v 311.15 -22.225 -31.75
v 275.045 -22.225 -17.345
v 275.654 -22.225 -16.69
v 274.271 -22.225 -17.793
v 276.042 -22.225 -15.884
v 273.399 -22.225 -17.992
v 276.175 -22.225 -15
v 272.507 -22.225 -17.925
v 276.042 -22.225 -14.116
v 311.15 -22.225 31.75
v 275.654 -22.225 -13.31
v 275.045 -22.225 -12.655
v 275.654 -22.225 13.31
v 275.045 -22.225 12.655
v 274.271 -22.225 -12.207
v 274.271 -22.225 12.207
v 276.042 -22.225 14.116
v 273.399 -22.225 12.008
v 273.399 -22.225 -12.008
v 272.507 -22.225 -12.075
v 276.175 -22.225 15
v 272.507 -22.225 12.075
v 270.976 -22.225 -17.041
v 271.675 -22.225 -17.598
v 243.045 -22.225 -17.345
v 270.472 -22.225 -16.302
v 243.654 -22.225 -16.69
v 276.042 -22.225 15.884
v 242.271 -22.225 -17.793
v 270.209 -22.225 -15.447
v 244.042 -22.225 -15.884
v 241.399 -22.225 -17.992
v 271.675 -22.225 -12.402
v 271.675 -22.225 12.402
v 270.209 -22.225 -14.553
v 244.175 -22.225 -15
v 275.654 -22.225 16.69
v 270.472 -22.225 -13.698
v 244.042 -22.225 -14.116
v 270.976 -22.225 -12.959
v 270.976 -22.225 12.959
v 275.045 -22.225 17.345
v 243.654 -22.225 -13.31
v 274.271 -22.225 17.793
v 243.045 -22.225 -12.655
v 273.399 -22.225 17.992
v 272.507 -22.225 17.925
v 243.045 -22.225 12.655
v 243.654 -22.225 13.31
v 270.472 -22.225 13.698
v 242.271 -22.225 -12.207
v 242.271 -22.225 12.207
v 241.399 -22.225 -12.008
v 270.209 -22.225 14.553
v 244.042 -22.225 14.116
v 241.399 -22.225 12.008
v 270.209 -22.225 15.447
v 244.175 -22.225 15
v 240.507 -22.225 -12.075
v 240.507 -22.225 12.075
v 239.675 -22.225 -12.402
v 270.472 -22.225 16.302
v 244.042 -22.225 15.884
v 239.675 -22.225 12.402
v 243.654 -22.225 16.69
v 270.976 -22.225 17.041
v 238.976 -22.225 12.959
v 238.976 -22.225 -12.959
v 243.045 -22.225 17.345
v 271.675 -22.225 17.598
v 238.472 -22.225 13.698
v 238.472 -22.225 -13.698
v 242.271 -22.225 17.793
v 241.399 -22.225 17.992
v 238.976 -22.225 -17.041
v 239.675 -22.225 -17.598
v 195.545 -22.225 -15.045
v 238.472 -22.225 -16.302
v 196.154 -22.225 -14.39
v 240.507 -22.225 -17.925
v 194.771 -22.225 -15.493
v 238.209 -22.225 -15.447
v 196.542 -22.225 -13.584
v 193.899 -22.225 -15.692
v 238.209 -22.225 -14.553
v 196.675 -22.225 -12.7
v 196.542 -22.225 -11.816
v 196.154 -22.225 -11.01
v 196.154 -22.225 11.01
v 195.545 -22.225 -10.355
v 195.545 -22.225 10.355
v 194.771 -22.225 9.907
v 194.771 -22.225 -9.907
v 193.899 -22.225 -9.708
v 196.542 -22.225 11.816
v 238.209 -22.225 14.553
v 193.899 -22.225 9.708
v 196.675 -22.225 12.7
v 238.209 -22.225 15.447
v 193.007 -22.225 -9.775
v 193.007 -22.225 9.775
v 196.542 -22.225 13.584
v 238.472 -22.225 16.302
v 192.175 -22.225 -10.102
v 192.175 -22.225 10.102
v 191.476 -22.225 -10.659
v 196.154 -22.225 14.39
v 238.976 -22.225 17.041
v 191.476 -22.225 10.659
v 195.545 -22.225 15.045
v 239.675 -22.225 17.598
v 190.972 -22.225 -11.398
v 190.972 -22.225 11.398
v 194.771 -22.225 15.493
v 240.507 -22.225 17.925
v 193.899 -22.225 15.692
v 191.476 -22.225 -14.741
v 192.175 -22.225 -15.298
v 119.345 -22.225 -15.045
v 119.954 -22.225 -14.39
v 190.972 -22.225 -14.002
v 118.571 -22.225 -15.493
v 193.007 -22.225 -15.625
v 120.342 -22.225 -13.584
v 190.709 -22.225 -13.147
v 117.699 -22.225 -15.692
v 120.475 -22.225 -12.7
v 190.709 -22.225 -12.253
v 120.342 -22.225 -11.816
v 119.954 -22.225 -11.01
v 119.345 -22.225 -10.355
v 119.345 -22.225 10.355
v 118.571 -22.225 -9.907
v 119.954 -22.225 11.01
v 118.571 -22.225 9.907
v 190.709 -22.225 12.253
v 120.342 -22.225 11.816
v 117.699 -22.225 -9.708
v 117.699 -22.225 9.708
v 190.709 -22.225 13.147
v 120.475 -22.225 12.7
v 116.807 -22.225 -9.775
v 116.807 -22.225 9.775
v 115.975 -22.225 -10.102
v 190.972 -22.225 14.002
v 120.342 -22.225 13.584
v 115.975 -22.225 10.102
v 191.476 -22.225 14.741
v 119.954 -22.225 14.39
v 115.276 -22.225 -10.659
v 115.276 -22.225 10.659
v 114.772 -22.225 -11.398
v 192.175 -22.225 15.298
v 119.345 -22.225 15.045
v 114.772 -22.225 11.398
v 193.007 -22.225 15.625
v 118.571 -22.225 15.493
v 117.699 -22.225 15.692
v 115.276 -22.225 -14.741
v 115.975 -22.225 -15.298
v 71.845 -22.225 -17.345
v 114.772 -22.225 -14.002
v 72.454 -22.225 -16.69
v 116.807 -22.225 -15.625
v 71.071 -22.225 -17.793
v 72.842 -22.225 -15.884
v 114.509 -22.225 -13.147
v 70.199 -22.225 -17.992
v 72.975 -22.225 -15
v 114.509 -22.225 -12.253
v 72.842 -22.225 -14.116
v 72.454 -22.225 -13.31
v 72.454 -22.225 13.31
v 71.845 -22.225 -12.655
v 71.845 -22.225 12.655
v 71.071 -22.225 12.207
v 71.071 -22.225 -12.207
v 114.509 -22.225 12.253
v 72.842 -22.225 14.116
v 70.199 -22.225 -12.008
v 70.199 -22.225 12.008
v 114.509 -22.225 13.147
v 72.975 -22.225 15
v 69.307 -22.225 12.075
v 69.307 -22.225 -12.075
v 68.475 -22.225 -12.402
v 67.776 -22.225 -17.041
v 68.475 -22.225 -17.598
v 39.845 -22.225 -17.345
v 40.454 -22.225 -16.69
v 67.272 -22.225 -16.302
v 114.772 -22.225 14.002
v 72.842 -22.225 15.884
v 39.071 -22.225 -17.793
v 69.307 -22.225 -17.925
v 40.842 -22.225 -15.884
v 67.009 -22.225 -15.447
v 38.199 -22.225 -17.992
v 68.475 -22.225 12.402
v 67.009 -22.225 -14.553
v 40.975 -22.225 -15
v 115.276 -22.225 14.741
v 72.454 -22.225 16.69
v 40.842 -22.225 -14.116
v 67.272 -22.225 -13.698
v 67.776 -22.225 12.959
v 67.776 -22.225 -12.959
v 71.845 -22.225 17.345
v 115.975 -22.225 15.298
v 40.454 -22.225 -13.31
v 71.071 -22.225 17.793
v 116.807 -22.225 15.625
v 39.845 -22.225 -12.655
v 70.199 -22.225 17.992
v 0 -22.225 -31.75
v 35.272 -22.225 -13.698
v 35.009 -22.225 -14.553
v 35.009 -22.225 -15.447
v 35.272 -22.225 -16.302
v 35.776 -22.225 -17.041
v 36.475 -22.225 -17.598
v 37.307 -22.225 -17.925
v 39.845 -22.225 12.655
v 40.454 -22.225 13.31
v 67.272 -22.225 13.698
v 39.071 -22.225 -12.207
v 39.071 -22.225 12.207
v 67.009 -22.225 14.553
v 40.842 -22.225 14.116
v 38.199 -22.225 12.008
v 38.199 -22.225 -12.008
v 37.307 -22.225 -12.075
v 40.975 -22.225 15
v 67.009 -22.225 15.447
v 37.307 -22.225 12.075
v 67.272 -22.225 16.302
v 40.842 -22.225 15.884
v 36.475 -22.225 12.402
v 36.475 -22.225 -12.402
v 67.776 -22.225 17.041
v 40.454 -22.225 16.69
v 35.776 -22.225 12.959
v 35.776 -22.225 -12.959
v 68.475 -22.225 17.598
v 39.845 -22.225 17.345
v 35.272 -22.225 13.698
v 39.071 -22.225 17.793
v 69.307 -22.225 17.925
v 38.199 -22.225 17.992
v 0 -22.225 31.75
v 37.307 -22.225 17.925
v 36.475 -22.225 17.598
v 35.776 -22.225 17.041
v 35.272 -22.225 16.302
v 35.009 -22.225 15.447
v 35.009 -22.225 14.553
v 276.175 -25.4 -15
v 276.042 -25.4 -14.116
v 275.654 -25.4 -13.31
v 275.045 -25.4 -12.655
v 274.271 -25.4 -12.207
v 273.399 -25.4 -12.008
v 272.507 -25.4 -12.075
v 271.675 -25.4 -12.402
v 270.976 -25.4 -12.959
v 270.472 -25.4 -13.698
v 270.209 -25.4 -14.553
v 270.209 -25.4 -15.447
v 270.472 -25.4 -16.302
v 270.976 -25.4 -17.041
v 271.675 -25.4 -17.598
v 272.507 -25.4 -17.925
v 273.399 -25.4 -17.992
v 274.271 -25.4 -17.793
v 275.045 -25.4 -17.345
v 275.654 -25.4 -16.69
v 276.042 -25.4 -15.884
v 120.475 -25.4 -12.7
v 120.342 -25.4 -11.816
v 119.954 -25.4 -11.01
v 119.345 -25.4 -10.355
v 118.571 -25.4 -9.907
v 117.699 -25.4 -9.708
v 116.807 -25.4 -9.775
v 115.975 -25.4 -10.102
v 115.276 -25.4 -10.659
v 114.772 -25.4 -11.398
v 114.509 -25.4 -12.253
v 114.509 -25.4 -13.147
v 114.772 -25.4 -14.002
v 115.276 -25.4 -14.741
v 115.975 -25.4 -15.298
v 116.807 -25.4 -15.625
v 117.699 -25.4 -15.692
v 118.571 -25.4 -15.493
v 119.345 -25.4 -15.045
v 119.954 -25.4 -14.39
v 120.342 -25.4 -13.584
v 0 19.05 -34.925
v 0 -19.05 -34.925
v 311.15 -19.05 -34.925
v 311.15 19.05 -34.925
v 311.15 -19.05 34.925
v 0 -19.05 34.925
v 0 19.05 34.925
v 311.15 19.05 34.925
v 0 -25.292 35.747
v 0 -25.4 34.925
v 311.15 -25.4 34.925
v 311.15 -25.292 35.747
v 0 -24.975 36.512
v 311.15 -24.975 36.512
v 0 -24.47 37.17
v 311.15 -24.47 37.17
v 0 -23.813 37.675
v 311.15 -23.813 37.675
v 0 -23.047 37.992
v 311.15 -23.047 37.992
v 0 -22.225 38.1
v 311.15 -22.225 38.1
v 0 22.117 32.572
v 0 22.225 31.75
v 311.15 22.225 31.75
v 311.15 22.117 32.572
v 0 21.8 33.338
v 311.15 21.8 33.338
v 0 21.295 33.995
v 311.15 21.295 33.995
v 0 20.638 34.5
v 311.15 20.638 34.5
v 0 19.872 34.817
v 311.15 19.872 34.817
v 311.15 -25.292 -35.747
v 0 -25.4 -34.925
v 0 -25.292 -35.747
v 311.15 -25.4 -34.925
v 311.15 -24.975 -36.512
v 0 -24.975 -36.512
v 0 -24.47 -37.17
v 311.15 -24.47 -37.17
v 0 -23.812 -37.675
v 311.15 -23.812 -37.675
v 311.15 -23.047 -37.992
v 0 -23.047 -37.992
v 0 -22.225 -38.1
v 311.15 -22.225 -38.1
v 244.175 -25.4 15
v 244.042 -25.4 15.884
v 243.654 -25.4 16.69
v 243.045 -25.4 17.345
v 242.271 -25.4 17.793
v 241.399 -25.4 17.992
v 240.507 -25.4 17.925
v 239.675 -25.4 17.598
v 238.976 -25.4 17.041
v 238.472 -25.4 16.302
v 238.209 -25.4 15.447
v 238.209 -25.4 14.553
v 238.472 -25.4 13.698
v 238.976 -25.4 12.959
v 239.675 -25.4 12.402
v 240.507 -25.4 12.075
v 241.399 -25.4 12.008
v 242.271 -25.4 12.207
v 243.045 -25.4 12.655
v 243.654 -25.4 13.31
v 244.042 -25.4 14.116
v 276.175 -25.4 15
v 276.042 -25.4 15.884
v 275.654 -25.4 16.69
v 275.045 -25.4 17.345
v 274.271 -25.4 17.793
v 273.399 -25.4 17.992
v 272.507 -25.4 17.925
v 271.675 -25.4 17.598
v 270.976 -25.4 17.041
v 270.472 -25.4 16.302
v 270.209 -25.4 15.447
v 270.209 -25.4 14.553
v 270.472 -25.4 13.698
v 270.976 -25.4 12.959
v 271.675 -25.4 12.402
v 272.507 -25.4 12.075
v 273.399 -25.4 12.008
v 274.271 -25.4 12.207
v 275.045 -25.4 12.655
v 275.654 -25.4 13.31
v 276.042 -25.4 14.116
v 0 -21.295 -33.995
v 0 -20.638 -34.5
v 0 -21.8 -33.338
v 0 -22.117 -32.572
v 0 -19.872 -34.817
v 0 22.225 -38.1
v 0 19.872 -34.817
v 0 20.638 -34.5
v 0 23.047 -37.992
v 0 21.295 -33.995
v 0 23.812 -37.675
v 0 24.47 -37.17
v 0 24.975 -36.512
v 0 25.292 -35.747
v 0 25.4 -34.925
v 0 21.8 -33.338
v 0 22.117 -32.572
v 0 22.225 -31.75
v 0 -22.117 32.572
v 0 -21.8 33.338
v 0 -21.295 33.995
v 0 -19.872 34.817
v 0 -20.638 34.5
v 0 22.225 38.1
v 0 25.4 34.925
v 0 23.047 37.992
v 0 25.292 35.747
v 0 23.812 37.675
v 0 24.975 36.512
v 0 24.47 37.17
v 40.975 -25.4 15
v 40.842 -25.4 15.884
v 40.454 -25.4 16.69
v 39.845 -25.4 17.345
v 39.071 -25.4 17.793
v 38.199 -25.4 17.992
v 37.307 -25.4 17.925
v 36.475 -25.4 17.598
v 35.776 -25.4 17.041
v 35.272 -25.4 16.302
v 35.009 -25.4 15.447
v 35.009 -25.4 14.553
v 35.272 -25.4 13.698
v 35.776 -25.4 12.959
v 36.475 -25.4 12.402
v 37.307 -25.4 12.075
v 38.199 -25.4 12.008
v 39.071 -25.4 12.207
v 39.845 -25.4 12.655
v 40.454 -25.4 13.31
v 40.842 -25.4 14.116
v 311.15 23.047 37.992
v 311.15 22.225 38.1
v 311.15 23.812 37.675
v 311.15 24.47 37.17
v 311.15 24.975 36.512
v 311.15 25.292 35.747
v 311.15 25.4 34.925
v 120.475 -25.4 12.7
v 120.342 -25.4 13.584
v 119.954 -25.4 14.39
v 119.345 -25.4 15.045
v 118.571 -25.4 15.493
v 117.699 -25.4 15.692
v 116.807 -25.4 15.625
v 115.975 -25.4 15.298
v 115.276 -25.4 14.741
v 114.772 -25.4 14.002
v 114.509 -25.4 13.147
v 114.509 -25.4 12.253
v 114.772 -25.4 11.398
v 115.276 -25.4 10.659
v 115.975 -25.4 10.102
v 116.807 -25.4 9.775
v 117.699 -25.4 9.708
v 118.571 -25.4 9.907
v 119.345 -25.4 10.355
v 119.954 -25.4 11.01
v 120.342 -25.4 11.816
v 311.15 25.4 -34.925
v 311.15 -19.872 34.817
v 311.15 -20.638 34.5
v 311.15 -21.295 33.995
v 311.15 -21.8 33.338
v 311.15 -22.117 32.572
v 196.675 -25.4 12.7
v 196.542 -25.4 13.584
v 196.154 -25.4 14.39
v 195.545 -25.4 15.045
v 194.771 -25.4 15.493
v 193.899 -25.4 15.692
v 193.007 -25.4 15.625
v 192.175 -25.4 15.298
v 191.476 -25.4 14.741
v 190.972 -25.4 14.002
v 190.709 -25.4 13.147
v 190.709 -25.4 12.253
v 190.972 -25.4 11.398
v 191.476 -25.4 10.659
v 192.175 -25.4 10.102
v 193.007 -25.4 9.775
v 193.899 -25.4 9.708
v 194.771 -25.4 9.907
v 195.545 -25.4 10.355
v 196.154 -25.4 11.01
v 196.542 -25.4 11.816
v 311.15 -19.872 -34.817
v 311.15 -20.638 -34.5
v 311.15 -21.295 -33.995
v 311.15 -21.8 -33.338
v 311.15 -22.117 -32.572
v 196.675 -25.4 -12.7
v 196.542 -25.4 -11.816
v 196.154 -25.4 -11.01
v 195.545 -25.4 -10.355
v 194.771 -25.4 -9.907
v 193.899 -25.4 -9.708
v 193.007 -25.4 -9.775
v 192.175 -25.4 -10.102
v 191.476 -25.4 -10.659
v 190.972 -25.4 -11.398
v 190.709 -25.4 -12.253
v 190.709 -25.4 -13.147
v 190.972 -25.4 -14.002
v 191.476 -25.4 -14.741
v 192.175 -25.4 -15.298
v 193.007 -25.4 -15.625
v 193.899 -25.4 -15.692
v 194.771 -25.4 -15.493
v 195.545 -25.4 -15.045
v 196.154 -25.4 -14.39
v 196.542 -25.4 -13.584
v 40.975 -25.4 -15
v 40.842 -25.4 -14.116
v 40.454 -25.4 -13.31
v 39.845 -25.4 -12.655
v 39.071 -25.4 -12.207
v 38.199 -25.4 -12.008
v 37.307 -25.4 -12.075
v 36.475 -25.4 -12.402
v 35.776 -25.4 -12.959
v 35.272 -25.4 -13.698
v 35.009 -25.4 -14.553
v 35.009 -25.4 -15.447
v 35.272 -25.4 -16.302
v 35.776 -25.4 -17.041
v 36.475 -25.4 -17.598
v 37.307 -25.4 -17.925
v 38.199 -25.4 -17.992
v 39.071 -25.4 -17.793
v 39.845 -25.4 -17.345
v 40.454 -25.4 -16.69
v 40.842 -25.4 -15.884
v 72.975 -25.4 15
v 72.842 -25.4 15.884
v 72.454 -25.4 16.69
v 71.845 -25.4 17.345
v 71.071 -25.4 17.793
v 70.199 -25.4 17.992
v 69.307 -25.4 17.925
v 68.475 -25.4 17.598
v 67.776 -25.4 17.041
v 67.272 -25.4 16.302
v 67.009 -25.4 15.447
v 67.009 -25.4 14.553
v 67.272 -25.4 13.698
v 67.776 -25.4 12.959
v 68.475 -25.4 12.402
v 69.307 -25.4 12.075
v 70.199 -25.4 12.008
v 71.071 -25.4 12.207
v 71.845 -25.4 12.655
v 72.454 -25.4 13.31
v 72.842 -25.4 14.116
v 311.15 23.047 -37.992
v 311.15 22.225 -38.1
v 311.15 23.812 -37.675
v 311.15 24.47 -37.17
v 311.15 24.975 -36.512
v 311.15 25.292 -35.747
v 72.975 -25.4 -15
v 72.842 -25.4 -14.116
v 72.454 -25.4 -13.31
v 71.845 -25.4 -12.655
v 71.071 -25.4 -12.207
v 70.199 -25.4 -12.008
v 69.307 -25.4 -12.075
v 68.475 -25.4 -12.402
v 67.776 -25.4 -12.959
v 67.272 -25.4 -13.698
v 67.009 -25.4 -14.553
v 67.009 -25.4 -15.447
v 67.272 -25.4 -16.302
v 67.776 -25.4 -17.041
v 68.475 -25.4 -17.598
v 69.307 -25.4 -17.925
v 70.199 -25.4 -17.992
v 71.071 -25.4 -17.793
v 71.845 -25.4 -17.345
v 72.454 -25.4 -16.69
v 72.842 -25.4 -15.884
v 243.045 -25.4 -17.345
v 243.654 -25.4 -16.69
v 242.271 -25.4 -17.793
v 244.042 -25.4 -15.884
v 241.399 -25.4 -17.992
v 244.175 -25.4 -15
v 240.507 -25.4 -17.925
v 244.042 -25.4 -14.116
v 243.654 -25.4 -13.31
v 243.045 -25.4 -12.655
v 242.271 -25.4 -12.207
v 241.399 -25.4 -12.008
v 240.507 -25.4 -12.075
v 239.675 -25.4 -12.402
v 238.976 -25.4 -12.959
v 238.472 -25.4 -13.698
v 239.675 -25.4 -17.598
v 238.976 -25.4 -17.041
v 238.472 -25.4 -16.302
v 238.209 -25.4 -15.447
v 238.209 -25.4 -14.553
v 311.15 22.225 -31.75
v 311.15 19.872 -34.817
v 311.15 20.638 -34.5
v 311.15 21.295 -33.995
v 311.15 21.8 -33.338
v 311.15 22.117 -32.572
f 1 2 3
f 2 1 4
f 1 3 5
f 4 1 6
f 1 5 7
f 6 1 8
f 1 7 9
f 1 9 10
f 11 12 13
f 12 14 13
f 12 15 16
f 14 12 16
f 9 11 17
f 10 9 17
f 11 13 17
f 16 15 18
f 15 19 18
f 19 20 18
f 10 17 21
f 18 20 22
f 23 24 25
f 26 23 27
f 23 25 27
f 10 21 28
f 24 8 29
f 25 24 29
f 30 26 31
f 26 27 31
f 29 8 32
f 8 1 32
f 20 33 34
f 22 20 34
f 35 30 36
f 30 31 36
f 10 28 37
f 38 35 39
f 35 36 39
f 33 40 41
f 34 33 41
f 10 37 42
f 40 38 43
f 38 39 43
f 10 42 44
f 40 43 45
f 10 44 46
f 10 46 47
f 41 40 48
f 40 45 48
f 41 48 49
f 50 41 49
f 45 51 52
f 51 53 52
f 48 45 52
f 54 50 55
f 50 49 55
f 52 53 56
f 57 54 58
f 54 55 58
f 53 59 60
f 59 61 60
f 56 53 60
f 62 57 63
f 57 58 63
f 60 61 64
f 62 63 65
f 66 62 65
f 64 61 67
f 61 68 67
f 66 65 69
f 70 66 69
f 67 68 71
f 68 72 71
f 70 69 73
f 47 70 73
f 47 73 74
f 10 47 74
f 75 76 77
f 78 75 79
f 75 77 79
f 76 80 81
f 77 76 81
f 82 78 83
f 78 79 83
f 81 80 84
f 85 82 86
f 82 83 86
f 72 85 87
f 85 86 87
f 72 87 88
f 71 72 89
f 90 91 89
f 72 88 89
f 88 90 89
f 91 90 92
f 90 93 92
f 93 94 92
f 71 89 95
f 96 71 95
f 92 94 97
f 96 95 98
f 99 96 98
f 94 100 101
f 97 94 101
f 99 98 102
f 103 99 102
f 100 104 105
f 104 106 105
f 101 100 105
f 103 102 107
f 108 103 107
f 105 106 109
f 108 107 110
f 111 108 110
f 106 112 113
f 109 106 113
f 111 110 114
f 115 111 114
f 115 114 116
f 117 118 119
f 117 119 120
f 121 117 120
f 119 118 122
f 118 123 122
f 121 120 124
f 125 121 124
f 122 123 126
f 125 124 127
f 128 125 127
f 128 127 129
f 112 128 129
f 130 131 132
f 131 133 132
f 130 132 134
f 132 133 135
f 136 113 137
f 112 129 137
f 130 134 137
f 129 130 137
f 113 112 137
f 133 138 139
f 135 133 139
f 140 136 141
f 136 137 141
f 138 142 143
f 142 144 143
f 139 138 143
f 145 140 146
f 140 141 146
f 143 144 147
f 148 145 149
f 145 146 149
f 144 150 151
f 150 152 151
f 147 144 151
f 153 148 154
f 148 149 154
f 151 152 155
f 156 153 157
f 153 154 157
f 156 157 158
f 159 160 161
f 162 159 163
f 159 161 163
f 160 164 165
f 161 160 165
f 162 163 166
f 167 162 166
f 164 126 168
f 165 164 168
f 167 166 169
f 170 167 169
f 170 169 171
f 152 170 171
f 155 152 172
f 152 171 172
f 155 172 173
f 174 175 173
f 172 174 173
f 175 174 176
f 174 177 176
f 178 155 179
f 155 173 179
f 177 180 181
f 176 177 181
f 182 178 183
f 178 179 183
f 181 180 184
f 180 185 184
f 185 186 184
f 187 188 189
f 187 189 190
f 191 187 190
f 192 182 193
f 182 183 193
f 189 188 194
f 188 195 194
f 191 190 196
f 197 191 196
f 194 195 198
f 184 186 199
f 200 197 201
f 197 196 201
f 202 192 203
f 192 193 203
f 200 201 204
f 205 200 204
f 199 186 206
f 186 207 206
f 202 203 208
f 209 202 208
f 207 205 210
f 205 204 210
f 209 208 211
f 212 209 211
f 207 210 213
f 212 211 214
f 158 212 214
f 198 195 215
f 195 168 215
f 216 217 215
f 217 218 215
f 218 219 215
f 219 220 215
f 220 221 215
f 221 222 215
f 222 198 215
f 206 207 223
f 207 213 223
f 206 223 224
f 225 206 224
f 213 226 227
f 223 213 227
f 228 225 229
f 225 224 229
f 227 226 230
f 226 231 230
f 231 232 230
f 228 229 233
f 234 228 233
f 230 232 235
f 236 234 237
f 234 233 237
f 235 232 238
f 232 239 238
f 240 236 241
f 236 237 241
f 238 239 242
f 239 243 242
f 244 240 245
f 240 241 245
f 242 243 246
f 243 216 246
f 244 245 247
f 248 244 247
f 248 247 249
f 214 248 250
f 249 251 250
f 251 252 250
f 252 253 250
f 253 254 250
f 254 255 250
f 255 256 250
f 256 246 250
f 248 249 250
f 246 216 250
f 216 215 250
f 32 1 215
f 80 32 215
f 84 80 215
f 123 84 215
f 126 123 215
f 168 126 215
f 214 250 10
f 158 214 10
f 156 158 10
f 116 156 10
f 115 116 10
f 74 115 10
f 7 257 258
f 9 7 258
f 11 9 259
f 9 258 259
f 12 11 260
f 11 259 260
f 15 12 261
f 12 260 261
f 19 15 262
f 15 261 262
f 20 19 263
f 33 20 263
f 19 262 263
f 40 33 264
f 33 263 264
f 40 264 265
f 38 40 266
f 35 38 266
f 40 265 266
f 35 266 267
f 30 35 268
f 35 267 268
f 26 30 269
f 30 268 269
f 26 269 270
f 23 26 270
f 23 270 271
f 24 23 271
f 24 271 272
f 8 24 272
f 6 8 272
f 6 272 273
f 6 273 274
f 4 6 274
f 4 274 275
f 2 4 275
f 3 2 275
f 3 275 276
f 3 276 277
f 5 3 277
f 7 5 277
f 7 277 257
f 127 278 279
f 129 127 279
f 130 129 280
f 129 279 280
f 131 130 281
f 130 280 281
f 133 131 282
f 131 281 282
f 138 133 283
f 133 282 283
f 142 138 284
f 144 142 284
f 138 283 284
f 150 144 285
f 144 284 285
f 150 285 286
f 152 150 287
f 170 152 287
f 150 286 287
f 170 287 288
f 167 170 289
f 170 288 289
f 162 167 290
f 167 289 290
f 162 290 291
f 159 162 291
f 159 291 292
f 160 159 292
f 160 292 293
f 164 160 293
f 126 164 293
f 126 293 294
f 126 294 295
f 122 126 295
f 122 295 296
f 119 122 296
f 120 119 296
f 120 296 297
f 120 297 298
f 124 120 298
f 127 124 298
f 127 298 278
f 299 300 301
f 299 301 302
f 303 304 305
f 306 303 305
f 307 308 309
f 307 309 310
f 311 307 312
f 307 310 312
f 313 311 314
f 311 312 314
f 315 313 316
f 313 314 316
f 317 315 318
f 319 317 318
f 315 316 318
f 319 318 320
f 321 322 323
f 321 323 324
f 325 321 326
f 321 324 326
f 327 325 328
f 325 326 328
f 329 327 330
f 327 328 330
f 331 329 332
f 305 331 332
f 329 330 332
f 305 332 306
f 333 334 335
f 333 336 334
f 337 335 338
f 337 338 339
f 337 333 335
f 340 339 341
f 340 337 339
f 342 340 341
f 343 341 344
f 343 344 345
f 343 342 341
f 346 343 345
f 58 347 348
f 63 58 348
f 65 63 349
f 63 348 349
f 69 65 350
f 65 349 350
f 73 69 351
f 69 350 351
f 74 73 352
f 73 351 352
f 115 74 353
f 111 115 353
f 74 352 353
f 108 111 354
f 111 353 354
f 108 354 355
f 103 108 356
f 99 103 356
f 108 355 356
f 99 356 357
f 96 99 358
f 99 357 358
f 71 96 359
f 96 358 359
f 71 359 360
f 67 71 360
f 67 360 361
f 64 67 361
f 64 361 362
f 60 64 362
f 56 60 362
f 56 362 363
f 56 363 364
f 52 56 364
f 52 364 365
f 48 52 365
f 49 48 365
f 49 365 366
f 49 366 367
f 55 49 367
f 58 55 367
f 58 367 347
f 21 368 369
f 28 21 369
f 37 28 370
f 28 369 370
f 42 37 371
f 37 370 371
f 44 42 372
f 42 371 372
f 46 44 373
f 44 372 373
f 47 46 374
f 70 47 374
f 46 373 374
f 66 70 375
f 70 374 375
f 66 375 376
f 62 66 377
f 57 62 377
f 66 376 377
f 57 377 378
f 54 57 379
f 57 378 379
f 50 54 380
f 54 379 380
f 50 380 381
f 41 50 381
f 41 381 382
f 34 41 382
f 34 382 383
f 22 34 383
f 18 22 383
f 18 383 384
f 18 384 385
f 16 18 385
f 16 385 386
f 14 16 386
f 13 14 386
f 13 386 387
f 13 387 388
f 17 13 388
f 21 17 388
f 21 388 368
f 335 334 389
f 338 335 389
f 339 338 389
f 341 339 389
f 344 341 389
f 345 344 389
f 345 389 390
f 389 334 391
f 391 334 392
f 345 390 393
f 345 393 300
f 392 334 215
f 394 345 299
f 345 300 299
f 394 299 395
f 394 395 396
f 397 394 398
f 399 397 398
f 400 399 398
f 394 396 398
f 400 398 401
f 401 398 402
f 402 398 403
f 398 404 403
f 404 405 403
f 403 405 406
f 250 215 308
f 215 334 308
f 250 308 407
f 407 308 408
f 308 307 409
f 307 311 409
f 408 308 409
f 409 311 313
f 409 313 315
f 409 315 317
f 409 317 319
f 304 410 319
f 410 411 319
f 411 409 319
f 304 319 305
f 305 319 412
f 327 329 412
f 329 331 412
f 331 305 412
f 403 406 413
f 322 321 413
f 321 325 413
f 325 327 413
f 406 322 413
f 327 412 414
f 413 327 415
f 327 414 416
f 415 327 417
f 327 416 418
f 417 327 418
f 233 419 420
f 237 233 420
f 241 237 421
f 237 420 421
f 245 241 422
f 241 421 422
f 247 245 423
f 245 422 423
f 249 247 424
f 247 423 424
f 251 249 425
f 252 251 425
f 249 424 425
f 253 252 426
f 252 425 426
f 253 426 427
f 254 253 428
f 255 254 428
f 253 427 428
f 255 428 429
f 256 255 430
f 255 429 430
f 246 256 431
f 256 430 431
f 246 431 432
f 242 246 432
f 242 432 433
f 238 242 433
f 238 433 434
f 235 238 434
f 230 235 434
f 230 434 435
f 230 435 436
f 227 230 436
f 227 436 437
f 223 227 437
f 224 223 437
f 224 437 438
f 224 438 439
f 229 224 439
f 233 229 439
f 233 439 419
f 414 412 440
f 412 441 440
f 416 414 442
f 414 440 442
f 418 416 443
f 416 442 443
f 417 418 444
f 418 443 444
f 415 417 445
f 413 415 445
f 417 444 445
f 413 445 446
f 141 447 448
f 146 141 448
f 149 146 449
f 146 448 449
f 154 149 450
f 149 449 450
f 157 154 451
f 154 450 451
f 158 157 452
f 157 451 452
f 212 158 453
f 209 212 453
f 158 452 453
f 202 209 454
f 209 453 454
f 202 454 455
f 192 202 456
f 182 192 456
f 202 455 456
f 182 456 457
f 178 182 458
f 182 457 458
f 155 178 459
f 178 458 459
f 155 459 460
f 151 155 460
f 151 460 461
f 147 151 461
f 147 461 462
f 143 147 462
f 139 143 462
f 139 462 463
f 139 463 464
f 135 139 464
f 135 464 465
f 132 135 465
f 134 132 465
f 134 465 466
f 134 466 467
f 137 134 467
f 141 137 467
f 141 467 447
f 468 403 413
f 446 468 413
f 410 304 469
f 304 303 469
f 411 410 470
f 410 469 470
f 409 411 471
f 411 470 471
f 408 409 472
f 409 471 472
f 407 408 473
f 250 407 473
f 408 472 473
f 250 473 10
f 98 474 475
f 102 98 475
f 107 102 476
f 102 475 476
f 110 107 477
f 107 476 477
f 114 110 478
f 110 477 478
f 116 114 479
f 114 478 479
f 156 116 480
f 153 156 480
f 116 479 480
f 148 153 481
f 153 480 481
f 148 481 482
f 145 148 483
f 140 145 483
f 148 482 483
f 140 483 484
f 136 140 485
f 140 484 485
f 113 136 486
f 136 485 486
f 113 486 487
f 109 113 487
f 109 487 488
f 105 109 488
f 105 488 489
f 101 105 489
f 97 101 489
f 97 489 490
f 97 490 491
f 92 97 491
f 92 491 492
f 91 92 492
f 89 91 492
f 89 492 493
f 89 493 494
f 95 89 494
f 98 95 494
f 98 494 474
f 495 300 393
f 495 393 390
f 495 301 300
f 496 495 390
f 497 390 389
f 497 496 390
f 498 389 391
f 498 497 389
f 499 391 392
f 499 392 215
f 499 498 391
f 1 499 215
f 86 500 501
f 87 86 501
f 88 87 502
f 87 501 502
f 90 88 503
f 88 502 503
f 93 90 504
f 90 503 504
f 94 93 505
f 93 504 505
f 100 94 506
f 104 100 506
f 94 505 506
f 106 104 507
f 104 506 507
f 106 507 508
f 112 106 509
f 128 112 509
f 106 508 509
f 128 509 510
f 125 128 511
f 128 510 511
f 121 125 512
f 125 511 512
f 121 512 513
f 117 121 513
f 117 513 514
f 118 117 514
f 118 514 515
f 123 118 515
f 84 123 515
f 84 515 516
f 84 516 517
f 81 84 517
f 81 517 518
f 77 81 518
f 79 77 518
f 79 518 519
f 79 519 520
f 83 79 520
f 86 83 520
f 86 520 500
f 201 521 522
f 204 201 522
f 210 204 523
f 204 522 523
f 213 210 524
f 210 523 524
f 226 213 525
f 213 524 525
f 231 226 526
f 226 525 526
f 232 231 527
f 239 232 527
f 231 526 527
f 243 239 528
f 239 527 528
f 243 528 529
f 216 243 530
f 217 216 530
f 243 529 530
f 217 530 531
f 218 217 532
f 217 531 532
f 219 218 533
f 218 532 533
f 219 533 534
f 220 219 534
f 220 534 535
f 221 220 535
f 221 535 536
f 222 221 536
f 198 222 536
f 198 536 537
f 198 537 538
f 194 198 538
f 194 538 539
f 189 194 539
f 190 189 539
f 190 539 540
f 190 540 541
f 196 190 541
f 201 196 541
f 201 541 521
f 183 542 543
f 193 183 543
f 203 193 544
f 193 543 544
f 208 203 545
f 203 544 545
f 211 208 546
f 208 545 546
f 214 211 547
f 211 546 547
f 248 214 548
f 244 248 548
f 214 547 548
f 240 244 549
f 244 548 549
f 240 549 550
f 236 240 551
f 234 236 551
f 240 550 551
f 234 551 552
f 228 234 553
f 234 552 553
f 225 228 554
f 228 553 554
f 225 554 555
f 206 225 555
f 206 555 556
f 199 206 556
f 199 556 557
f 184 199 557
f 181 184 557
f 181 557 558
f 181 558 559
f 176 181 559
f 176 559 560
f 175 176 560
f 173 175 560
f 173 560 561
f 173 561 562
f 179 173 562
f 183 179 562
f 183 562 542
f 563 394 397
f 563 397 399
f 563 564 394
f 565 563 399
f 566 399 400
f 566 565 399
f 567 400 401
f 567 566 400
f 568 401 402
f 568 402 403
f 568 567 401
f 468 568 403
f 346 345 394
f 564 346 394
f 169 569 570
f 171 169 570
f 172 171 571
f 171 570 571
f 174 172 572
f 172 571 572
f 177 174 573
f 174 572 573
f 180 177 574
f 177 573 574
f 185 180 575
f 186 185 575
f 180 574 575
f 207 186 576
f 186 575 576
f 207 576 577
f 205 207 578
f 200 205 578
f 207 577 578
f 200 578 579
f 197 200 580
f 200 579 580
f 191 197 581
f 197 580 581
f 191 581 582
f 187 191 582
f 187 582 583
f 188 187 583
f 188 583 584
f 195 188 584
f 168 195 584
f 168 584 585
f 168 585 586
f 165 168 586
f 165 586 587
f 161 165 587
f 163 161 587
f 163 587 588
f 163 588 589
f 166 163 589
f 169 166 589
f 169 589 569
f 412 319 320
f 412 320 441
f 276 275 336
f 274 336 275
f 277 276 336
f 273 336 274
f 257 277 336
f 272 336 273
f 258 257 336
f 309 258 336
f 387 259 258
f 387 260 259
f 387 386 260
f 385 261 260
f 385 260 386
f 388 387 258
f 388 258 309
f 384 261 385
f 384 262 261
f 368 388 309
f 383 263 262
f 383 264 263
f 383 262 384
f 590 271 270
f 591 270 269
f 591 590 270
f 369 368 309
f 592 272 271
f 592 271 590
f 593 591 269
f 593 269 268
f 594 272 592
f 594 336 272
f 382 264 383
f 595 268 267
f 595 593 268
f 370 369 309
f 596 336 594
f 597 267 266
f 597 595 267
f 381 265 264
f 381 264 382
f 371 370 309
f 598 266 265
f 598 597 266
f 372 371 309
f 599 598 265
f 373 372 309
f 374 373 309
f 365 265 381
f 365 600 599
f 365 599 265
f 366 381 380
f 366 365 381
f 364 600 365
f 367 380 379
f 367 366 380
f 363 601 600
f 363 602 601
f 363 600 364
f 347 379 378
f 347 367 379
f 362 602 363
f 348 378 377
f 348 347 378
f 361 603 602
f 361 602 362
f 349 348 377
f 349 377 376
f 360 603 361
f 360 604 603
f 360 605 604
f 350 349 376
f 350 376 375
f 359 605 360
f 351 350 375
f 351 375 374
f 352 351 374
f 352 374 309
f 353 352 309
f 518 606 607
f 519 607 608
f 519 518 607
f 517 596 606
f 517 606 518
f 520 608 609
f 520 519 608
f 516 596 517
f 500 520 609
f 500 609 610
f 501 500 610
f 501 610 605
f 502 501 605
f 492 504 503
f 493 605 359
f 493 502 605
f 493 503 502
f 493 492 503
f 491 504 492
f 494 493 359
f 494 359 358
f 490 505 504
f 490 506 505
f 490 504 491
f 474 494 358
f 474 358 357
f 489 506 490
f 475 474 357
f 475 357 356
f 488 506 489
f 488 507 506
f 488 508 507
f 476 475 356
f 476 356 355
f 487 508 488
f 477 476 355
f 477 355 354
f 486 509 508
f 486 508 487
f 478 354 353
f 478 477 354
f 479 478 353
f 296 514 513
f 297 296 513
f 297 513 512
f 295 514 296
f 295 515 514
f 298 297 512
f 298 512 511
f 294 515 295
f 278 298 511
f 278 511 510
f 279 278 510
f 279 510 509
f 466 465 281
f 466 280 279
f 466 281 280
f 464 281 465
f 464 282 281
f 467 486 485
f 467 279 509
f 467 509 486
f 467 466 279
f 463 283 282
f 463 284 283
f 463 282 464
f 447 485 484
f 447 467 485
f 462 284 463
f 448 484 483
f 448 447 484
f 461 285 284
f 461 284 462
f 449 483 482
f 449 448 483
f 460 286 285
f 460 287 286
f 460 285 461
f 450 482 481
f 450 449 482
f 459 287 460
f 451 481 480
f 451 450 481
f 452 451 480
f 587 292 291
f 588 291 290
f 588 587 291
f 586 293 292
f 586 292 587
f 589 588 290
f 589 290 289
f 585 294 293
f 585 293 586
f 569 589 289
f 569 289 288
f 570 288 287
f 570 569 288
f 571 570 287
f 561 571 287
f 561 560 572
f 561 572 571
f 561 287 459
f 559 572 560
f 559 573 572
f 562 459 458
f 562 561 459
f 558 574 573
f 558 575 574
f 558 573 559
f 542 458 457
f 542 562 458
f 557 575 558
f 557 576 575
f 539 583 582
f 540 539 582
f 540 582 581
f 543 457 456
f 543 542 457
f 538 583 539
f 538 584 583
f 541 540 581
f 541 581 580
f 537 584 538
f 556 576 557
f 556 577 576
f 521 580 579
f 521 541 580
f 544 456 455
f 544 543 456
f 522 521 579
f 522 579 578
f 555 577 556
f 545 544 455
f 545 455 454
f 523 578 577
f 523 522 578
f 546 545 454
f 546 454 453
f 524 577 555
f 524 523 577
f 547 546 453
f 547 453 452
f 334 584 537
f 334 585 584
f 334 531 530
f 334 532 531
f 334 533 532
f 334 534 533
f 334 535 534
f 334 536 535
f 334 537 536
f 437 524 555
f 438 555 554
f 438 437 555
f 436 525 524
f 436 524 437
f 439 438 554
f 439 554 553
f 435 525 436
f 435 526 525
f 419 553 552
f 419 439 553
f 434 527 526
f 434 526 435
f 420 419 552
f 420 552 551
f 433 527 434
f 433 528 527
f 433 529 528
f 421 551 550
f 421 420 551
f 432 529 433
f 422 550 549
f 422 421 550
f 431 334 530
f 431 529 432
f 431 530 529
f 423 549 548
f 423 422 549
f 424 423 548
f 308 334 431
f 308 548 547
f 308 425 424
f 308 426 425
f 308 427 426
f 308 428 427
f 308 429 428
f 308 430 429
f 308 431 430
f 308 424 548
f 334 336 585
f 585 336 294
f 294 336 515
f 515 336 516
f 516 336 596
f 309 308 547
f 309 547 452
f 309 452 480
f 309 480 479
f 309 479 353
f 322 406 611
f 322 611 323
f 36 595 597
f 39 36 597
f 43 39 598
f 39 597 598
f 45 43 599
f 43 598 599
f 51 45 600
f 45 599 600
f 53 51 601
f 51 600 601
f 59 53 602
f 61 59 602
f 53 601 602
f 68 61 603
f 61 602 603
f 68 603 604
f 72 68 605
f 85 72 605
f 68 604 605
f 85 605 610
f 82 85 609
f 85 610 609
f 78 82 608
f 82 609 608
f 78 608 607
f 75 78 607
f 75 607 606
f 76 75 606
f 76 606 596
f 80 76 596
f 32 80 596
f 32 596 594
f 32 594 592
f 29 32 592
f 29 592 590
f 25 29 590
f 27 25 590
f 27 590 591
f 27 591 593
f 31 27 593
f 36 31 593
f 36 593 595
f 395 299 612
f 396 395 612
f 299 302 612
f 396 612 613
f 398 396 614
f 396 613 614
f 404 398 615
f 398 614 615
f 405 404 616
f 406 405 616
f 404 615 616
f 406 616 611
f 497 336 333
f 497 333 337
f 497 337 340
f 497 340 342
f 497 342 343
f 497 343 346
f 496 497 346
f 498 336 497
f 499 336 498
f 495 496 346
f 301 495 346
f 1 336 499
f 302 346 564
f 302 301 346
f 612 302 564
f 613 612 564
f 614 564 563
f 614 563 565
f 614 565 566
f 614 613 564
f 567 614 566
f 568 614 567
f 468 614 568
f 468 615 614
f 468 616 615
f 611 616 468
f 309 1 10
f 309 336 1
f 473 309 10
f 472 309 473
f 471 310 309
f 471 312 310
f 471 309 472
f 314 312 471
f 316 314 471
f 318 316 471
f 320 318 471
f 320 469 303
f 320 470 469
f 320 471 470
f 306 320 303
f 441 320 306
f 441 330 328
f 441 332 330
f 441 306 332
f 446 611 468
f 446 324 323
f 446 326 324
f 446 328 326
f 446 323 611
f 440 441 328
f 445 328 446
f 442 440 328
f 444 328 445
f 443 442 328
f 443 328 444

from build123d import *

# Parameters (mm, degrees)
F0_W     = 50.8
F0_H     = 76.2
F0_W_2   = 44.45
F0_H_2   = 69.85
F2_DEPTH = 311.15
F3_R     = 3.175
F4_R     = 3
F5_DEPTH = 25.4
F6_DEPTH = 25.4


# Not quite as in the source:
# - a variable given as a bare number and used for a length is read in inches; the dataset says mm whatever the document's units were


with BuildPart() as f2:
    # F0 (on Right) → F2 (new body)
    with BuildSketch(Plane.YZ):
        Rectangle(F0_W, F0_H)
        Rectangle(F0_W_2, F0_H_2, mode=Mode.SUBTRACT)
    extrude(amount=F2_DEPTH)

    # F3
    f3_edges = [f2.edges().sort_by_distance(p)[0] for p in [
        (155.575, -25.4, 38.1),
        (155.575, -22.225, 34.925),
        (155.575, 22.225, 34.925),
        (155.575, 25.4, 38.1),
        (155.575, 25.4, -38.1),
        (155.575, -25.4, -38.1),
        (155.575, 22.225, -34.925),
        (155.575, -22.225, -34.925),
    ]]
    fillet(f3_edges, radius=F3_R)

    # F4 (on face) → F5 (cut)
    with BuildSketch(Plane.XZ.offset(25.4)):
        with Locations((37.975, 15)):
            Circle(F4_R)
        with Locations((69.975, 15)):
            Circle(F4_R)
        with Locations((69.975, -15)):
            Circle(F4_R)
        with Locations((37.975, -15)):
            Circle(F4_R)
        with Locations((241.175, 15)):
            Circle(F4_R)
        with Locations((273.175, 15)):
            Circle(F4_R)
        with Locations((273.175, -15)):
            Circle(F4_R)
        with Locations((241.175, -15)):
            Circle(F4_R)
    extrude(amount=-F5_DEPTH, mode=Mode.SUBTRACT)

    # F4 (on face) → F6 (cut)
    with BuildSketch(Plane.XZ.offset(25.4)):
        with Locations((117.475, 12.7)):
            Circle(F4_R)
        with Locations((117.475, -12.7)):
            Circle(F4_R)
        with Locations((193.675, -12.7)):
            Circle(F4_R)
        with Locations((193.675, 12.7)):
            Circle(F4_R)
    extrude(amount=-F6_DEPTH, mode=Mode.SUBTRACT)


solid = f2.part
